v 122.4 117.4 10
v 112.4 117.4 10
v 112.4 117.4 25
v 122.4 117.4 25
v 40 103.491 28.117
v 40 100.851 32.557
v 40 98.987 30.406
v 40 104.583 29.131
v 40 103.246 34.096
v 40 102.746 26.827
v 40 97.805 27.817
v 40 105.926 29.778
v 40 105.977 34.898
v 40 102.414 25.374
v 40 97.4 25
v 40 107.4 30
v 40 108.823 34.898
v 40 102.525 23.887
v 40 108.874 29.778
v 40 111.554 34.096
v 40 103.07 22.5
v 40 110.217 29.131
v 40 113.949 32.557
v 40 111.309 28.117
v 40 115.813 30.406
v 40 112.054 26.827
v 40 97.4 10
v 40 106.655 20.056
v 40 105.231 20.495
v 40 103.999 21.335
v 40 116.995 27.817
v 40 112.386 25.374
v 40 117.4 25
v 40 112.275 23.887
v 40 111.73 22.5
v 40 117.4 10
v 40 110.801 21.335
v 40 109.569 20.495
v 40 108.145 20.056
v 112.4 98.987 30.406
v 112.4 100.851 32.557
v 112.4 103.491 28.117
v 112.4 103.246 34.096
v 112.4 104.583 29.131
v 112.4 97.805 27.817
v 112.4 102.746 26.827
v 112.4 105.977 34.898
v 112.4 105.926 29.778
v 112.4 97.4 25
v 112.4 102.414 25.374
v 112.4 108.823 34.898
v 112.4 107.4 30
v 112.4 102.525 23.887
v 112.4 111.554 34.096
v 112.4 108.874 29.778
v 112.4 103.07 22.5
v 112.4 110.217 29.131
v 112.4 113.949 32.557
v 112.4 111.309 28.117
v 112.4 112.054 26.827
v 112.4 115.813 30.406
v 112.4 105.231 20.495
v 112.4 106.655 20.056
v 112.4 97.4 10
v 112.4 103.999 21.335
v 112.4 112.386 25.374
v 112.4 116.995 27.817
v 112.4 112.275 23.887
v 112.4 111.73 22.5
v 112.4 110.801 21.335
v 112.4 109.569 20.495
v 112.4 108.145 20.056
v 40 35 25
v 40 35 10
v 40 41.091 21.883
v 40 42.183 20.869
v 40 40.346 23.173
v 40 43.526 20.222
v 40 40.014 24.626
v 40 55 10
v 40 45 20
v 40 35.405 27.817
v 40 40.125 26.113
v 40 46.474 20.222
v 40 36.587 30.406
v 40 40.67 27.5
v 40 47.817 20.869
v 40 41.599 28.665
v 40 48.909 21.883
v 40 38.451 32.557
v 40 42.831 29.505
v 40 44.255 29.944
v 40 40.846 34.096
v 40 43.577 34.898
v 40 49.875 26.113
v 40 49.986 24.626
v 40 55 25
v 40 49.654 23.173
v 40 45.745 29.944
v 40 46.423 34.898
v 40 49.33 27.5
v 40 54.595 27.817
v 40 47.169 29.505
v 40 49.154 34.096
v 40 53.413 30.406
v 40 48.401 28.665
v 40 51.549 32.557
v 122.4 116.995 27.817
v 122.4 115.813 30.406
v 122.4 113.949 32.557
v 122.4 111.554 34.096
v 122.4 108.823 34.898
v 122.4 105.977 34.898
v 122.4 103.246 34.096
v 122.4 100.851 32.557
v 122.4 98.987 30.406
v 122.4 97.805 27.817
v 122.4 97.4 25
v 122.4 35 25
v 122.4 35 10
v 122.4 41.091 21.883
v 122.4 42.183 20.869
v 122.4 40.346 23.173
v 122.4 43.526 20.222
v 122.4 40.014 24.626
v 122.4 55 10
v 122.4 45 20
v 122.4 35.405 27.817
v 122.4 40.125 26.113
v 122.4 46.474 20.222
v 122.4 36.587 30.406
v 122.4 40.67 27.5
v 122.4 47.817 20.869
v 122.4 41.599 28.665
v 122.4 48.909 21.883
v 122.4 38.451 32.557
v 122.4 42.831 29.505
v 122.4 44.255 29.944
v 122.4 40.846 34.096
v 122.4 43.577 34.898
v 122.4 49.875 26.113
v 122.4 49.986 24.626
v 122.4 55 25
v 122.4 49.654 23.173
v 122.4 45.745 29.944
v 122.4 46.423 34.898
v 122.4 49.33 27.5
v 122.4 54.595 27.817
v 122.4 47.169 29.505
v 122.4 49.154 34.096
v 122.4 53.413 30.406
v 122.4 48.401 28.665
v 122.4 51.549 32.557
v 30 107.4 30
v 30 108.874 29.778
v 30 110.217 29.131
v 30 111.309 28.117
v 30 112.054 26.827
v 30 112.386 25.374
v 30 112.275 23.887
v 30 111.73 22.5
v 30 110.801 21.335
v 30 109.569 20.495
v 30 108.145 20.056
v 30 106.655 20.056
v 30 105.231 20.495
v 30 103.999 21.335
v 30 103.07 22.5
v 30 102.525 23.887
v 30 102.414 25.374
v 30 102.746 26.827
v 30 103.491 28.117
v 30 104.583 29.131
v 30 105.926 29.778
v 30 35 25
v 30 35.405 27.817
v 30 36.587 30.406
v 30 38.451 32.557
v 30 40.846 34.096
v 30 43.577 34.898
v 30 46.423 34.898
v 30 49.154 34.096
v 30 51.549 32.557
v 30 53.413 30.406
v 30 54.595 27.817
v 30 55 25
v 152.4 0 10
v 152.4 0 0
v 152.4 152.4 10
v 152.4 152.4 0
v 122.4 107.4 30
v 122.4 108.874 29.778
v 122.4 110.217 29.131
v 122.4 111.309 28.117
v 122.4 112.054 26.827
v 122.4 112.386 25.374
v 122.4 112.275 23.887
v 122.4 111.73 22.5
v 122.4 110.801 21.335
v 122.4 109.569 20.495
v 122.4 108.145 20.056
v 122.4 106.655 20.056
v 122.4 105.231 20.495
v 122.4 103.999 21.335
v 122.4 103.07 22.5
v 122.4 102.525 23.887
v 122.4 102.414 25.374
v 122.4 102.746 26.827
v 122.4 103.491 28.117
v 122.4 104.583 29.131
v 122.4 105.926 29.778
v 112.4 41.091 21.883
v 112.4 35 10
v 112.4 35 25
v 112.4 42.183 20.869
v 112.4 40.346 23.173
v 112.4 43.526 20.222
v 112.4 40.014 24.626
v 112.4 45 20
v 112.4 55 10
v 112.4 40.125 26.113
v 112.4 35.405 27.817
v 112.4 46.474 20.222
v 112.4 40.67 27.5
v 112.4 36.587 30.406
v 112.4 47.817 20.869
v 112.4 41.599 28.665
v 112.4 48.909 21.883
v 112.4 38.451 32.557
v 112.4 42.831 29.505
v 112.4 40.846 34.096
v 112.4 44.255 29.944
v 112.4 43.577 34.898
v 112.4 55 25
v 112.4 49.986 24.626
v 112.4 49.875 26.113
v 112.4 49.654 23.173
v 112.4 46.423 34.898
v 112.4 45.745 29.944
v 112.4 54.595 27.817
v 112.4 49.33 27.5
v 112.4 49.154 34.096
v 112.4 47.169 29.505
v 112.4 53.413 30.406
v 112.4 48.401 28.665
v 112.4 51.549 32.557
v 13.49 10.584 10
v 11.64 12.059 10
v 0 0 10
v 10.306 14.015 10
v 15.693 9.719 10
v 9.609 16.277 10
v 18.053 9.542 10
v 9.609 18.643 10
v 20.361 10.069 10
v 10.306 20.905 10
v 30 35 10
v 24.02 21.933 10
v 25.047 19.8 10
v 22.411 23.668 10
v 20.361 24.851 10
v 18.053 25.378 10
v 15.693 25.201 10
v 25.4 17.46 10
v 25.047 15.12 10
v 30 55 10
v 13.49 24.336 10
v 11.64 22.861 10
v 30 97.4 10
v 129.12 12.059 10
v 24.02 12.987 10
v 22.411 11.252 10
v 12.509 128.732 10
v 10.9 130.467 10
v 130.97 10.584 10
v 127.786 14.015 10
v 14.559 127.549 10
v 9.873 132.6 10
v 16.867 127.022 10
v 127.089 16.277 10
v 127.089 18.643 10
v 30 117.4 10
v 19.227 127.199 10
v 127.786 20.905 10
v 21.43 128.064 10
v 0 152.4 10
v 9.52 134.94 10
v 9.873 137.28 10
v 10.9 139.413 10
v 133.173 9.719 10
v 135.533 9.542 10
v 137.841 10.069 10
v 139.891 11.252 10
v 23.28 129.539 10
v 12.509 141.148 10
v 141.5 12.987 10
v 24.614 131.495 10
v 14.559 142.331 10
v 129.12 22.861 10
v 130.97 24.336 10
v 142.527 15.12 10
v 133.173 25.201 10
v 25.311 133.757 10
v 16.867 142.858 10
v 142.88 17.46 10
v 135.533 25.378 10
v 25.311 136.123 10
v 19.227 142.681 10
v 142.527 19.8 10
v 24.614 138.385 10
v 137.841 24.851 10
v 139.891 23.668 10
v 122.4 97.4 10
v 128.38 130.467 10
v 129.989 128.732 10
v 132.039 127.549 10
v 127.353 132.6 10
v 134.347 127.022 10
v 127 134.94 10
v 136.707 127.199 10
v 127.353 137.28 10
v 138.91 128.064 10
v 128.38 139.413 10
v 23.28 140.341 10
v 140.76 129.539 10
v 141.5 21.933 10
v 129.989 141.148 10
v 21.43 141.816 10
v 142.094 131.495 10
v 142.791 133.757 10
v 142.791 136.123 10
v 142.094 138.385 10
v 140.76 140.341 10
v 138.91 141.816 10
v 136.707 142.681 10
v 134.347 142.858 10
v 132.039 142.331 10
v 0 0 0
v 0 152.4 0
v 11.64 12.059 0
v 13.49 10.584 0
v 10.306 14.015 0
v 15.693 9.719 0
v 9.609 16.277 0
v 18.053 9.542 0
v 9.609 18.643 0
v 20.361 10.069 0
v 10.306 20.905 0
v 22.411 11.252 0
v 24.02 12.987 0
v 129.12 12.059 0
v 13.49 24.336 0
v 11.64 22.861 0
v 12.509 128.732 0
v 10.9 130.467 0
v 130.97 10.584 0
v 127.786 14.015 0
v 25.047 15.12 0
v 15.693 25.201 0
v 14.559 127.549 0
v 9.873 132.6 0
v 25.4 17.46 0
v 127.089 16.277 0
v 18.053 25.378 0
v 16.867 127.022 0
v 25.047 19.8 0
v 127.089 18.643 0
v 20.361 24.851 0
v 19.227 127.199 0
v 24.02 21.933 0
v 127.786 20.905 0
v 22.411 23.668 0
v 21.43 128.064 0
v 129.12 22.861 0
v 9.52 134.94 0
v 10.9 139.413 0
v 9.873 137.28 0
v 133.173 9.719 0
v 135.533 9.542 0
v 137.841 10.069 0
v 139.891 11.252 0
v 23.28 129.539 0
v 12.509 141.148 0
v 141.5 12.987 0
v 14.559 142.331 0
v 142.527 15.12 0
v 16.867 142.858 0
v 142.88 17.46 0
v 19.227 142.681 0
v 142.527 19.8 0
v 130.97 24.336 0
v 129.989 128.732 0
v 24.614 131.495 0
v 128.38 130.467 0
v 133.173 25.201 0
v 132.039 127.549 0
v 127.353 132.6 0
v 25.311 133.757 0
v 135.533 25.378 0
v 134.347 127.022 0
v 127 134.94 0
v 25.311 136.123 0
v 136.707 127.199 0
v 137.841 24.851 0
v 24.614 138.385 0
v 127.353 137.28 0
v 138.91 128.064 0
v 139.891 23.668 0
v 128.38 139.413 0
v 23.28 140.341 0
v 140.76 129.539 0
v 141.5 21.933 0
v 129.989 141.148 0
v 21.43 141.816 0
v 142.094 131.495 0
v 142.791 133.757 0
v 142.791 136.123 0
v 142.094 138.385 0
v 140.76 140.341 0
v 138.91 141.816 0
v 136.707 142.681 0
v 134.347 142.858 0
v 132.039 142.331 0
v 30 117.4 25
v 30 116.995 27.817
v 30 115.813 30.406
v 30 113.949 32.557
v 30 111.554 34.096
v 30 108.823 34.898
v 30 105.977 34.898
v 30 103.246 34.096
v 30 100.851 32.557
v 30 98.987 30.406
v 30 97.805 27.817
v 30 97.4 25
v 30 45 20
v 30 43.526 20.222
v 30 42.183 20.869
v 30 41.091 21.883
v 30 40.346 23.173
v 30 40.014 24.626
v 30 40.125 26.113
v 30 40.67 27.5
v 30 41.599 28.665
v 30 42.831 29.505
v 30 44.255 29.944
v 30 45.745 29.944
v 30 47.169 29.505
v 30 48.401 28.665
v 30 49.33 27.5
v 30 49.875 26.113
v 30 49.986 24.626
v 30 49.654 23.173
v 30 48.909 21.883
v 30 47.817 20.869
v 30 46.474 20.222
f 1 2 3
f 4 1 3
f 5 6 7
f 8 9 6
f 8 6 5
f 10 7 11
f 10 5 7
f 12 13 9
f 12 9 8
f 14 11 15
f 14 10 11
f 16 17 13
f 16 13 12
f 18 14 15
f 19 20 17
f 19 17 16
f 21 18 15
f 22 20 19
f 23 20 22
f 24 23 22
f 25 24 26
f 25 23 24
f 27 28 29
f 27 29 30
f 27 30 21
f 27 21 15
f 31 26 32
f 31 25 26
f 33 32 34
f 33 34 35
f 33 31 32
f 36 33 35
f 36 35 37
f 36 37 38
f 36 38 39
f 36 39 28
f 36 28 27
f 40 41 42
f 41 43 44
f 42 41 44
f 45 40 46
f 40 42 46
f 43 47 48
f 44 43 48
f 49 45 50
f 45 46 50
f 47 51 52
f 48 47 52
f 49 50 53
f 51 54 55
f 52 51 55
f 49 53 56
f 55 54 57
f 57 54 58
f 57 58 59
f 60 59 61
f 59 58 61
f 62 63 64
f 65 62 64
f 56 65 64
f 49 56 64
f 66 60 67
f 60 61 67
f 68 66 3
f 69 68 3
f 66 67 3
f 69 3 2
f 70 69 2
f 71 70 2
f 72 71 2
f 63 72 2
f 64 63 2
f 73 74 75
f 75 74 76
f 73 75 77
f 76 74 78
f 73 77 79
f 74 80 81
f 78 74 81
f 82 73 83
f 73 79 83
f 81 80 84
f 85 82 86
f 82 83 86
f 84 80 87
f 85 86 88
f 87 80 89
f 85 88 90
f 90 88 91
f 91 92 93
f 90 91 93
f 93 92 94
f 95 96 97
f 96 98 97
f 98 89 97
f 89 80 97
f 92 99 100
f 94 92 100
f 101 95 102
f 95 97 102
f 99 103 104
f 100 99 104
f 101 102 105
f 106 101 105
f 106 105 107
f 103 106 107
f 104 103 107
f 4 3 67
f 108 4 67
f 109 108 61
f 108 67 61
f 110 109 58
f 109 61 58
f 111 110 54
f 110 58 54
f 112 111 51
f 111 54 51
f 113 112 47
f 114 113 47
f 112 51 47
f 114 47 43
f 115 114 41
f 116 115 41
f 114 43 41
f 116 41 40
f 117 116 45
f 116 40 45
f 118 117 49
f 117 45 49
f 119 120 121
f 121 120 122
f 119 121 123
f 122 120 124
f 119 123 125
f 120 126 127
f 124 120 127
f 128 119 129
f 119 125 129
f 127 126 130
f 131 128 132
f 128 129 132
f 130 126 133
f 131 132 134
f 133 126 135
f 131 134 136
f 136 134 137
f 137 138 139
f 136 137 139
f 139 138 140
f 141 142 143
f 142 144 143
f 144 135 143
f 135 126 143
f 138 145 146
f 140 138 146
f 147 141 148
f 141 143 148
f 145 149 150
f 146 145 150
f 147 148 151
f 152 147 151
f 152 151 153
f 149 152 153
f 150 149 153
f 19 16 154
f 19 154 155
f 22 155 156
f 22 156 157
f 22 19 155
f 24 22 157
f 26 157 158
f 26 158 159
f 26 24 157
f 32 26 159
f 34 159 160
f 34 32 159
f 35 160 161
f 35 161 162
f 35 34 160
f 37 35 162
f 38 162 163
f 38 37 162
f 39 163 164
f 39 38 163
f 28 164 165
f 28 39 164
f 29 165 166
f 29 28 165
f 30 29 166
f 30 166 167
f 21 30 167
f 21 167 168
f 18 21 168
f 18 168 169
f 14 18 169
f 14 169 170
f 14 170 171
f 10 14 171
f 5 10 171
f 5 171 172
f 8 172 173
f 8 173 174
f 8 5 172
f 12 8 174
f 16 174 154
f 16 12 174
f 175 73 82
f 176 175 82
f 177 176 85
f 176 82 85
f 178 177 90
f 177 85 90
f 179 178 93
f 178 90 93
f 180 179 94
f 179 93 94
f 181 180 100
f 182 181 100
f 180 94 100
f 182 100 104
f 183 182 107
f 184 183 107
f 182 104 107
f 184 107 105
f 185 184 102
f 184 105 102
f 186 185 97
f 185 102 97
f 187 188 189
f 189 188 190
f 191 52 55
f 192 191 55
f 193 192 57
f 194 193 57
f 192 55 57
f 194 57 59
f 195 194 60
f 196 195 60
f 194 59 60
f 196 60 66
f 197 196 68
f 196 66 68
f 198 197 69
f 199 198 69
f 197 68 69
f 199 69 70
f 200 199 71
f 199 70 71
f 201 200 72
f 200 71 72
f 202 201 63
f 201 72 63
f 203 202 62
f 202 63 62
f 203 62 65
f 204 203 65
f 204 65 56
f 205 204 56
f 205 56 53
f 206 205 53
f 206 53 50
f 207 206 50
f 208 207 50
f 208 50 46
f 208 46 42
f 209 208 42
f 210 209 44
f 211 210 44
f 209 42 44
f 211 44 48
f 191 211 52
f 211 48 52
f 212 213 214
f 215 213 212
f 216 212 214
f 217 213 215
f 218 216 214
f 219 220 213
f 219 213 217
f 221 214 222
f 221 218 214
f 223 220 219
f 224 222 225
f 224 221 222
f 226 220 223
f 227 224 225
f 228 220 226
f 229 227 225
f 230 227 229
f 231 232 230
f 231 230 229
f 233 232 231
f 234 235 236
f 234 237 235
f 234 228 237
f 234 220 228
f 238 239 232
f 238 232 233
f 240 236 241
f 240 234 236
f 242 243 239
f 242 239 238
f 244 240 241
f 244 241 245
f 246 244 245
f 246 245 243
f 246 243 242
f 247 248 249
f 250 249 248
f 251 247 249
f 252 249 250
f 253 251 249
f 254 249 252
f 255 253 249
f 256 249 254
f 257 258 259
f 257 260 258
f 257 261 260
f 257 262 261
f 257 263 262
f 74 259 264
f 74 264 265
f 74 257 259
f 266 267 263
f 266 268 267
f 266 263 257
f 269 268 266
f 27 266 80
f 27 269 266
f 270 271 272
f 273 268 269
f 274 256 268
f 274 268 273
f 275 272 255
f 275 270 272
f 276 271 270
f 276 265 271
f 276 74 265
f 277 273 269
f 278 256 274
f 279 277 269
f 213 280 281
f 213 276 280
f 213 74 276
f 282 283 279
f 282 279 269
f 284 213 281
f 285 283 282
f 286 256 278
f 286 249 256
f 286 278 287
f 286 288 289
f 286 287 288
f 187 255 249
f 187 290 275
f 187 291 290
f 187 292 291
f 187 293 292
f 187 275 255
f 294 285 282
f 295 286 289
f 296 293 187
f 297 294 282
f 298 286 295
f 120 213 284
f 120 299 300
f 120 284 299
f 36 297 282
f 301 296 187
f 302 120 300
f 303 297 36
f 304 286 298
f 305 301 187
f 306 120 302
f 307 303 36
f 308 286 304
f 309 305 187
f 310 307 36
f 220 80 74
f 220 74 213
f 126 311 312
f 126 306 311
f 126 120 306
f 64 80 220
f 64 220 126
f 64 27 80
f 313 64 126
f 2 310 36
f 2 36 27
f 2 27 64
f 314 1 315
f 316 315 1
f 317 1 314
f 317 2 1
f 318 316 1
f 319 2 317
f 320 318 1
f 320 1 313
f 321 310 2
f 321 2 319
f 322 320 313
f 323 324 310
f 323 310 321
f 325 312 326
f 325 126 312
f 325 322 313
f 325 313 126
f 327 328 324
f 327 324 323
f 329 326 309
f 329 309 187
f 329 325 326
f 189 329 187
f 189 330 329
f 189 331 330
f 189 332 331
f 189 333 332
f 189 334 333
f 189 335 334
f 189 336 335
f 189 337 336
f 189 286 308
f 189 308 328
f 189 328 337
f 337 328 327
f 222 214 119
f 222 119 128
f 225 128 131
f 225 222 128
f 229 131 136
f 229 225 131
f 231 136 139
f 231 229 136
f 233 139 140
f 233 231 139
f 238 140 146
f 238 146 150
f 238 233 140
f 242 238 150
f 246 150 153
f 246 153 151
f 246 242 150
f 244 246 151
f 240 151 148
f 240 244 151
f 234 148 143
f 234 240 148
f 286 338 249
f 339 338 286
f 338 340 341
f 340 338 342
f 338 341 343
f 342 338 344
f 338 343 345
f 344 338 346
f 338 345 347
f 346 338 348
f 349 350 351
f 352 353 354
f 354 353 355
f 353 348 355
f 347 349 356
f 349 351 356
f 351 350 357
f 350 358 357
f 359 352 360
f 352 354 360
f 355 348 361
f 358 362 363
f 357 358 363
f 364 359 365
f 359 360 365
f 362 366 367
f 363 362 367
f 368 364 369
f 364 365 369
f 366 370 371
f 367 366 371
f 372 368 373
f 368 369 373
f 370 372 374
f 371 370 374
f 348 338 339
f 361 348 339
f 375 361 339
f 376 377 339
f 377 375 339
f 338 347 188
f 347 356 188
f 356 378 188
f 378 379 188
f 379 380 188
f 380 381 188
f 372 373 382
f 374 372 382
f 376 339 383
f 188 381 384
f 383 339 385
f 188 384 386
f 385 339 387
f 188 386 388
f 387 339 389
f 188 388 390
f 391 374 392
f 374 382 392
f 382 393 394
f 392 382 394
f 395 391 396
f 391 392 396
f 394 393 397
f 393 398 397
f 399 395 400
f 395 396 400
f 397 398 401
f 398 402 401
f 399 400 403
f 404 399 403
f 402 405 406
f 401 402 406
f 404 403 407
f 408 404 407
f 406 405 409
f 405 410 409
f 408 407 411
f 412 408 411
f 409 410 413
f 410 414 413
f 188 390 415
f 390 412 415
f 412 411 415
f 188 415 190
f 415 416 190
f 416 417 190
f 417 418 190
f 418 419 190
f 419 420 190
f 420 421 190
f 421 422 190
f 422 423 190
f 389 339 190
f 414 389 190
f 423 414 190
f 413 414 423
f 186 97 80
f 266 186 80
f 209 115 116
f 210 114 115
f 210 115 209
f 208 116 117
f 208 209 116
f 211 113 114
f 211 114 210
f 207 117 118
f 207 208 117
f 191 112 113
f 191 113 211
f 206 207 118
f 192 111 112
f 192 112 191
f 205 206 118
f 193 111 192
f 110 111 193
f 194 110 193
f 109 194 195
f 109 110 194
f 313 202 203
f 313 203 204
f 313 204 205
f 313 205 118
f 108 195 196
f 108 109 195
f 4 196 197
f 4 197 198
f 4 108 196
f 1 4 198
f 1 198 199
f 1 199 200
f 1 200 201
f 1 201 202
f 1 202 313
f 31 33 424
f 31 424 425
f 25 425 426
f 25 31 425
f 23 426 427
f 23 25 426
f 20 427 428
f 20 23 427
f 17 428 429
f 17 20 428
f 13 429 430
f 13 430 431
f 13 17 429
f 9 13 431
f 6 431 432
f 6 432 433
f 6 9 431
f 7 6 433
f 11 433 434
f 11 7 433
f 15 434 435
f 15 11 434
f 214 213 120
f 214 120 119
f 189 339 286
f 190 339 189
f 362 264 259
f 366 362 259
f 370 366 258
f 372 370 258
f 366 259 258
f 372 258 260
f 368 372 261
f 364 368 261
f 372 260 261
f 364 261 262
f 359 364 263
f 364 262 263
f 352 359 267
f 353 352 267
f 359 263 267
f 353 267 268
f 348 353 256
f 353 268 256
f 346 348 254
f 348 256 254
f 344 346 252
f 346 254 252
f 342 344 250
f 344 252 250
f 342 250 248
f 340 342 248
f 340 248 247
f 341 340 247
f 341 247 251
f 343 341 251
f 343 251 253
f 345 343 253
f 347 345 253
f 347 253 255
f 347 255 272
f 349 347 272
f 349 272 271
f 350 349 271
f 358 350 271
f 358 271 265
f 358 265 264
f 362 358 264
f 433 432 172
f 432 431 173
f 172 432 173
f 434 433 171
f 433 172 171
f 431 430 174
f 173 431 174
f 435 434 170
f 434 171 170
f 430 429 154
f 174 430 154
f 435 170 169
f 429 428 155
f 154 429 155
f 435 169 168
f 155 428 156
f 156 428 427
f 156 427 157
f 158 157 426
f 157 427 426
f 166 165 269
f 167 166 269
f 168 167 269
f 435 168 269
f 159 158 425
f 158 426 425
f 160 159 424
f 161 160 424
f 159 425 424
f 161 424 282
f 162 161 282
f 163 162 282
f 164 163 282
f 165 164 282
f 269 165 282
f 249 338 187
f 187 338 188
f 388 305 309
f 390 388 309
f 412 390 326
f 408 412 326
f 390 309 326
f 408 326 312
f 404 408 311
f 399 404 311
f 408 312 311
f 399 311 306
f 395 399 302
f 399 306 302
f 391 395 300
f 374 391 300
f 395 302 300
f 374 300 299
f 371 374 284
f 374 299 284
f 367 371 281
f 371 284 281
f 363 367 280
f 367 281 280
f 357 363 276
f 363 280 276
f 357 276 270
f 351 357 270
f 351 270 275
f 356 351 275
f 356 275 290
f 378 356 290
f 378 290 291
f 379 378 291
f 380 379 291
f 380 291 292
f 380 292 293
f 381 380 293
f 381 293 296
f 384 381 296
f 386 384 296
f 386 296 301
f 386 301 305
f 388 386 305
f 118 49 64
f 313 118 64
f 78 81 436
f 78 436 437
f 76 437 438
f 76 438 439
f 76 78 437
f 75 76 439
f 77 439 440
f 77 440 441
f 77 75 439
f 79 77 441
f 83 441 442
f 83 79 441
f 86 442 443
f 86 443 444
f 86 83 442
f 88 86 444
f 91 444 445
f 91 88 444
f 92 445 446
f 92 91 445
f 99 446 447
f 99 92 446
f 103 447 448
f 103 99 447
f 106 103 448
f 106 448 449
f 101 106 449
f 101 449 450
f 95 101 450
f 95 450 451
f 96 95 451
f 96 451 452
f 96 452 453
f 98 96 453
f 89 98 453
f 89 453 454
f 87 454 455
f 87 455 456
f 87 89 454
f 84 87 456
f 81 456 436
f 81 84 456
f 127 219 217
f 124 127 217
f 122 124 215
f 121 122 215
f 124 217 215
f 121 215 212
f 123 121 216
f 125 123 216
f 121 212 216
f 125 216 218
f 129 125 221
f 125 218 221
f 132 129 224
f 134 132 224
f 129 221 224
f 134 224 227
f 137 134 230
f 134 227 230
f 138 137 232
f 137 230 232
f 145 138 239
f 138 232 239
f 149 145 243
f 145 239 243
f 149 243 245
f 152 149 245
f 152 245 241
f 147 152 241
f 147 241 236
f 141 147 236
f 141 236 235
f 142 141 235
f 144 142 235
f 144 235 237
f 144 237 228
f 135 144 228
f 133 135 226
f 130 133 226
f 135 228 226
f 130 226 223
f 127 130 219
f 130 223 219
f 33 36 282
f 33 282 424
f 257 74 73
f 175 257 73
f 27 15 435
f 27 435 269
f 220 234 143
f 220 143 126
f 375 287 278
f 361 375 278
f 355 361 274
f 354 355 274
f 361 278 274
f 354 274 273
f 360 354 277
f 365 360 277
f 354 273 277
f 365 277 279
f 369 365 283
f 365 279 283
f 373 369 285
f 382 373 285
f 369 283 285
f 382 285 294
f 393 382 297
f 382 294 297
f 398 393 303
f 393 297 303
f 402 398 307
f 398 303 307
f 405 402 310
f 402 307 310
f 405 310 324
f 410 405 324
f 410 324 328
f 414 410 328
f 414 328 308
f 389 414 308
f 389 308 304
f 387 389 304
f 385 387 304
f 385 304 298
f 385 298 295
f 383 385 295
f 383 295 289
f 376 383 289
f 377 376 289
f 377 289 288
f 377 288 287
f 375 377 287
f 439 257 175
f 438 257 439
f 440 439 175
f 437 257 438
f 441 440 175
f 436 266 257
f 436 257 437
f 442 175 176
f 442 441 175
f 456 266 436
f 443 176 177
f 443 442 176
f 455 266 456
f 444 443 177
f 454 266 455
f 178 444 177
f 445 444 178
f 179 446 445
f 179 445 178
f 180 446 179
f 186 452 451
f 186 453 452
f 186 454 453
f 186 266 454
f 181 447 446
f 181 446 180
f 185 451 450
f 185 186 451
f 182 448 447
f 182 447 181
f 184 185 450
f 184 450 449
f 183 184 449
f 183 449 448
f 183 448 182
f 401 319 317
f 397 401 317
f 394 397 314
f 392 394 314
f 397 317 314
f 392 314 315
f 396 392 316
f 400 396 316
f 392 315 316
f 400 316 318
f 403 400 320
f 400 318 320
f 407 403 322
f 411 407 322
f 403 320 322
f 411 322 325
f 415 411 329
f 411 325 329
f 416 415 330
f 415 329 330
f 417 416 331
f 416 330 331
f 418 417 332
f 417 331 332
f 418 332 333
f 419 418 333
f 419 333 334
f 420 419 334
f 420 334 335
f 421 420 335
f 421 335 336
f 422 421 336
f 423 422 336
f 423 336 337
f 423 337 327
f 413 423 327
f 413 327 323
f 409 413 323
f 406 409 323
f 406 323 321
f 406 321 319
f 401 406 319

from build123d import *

# Parameters (mm, degrees)
CROQUIS1_W              = 152.4
CROQUIS1_H              = 152.4
SALIENTE_EXTRUIR1_DEPTH = 10
CROQUIS2_R              = 7.94
CORTAR_EXTRUIR1_DEPTH   = 216.758012597
CROQUIS4_R              = 5
SALIENTE_EXTRUIR2_DEPTH = 10


with BuildPart() as part:
    # Croquis1 → Saliente-Extruir1 (new body)
    with BuildSketch(Plane.XY):
        with Locations((76.2, 76.2)):
            Rectangle(CROQUIS1_W, CROQUIS1_H)
    extrude(amount=SALIENTE_EXTRUIR1_DEPTH)

    # Croquis2 → Cortar-Extruir1 (cut, through all)
    with BuildSketch(Plane.XY.offset(10)):
        with Locations((134.94, 17.46)):
            Circle(CROQUIS2_R)
        with Locations((17.46, 17.46)):
            Circle(CROQUIS2_R)
        with Locations(Location((134.94, 134.94, 0), (0, 0, 180))):
            Circle(CROQUIS2_R)
        with Locations(Location((17.46, 134.94, 0), (0, 0, 180))):
            Circle(CROQUIS2_R)
    extrude(amount=-CORTAR_EXTRUIR1_DEPTH, mode=Mode.SUBTRACT)

    # Croquis4 → Saliente-Extruir2 (add)
    # profile 1 of 2: a face of its own
    with BuildSketch(Plane.ZY.offset(-40)):
        with BuildLine():
            Line((10, 117.4), (25, 117.4))
            ThreePointArc((25, 117.4), (35, 107.4), (25, 97.4))
            Line((25, 97.4), (10, 97.4))
            Line((10, 97.4), (10, 117.4))
        make_face()
        with Locations((25, 107.4)):
            Circle(CROQUIS4_R, mode=Mode.SUBTRACT)
    # profile 2 of 2: a face of its own
    with BuildSketch(Plane.ZY.offset(-40)):
        with BuildLine():
            Line((25, 55), (10, 55))
            Line((10, 55), (10, 35))
            Line((10, 35), (25, 35))
            ThreePointArc((25, 35), (35, 45), (25, 55))
        make_face()
        with Locations(Location((25, 45, 0), (0, 0, 180))):
            Circle(CROQUIS4_R, mode=Mode.SUBTRACT)
    saliente_extruir2 = extrude(amount=SALIENTE_EXTRUIR2_DEPTH)

    # Simetría1: Saliente-Extruir2 across plane
    add(saliente_extruir2.mirror(Plane.ZY.offset(-76.2)))


solid = part.part
